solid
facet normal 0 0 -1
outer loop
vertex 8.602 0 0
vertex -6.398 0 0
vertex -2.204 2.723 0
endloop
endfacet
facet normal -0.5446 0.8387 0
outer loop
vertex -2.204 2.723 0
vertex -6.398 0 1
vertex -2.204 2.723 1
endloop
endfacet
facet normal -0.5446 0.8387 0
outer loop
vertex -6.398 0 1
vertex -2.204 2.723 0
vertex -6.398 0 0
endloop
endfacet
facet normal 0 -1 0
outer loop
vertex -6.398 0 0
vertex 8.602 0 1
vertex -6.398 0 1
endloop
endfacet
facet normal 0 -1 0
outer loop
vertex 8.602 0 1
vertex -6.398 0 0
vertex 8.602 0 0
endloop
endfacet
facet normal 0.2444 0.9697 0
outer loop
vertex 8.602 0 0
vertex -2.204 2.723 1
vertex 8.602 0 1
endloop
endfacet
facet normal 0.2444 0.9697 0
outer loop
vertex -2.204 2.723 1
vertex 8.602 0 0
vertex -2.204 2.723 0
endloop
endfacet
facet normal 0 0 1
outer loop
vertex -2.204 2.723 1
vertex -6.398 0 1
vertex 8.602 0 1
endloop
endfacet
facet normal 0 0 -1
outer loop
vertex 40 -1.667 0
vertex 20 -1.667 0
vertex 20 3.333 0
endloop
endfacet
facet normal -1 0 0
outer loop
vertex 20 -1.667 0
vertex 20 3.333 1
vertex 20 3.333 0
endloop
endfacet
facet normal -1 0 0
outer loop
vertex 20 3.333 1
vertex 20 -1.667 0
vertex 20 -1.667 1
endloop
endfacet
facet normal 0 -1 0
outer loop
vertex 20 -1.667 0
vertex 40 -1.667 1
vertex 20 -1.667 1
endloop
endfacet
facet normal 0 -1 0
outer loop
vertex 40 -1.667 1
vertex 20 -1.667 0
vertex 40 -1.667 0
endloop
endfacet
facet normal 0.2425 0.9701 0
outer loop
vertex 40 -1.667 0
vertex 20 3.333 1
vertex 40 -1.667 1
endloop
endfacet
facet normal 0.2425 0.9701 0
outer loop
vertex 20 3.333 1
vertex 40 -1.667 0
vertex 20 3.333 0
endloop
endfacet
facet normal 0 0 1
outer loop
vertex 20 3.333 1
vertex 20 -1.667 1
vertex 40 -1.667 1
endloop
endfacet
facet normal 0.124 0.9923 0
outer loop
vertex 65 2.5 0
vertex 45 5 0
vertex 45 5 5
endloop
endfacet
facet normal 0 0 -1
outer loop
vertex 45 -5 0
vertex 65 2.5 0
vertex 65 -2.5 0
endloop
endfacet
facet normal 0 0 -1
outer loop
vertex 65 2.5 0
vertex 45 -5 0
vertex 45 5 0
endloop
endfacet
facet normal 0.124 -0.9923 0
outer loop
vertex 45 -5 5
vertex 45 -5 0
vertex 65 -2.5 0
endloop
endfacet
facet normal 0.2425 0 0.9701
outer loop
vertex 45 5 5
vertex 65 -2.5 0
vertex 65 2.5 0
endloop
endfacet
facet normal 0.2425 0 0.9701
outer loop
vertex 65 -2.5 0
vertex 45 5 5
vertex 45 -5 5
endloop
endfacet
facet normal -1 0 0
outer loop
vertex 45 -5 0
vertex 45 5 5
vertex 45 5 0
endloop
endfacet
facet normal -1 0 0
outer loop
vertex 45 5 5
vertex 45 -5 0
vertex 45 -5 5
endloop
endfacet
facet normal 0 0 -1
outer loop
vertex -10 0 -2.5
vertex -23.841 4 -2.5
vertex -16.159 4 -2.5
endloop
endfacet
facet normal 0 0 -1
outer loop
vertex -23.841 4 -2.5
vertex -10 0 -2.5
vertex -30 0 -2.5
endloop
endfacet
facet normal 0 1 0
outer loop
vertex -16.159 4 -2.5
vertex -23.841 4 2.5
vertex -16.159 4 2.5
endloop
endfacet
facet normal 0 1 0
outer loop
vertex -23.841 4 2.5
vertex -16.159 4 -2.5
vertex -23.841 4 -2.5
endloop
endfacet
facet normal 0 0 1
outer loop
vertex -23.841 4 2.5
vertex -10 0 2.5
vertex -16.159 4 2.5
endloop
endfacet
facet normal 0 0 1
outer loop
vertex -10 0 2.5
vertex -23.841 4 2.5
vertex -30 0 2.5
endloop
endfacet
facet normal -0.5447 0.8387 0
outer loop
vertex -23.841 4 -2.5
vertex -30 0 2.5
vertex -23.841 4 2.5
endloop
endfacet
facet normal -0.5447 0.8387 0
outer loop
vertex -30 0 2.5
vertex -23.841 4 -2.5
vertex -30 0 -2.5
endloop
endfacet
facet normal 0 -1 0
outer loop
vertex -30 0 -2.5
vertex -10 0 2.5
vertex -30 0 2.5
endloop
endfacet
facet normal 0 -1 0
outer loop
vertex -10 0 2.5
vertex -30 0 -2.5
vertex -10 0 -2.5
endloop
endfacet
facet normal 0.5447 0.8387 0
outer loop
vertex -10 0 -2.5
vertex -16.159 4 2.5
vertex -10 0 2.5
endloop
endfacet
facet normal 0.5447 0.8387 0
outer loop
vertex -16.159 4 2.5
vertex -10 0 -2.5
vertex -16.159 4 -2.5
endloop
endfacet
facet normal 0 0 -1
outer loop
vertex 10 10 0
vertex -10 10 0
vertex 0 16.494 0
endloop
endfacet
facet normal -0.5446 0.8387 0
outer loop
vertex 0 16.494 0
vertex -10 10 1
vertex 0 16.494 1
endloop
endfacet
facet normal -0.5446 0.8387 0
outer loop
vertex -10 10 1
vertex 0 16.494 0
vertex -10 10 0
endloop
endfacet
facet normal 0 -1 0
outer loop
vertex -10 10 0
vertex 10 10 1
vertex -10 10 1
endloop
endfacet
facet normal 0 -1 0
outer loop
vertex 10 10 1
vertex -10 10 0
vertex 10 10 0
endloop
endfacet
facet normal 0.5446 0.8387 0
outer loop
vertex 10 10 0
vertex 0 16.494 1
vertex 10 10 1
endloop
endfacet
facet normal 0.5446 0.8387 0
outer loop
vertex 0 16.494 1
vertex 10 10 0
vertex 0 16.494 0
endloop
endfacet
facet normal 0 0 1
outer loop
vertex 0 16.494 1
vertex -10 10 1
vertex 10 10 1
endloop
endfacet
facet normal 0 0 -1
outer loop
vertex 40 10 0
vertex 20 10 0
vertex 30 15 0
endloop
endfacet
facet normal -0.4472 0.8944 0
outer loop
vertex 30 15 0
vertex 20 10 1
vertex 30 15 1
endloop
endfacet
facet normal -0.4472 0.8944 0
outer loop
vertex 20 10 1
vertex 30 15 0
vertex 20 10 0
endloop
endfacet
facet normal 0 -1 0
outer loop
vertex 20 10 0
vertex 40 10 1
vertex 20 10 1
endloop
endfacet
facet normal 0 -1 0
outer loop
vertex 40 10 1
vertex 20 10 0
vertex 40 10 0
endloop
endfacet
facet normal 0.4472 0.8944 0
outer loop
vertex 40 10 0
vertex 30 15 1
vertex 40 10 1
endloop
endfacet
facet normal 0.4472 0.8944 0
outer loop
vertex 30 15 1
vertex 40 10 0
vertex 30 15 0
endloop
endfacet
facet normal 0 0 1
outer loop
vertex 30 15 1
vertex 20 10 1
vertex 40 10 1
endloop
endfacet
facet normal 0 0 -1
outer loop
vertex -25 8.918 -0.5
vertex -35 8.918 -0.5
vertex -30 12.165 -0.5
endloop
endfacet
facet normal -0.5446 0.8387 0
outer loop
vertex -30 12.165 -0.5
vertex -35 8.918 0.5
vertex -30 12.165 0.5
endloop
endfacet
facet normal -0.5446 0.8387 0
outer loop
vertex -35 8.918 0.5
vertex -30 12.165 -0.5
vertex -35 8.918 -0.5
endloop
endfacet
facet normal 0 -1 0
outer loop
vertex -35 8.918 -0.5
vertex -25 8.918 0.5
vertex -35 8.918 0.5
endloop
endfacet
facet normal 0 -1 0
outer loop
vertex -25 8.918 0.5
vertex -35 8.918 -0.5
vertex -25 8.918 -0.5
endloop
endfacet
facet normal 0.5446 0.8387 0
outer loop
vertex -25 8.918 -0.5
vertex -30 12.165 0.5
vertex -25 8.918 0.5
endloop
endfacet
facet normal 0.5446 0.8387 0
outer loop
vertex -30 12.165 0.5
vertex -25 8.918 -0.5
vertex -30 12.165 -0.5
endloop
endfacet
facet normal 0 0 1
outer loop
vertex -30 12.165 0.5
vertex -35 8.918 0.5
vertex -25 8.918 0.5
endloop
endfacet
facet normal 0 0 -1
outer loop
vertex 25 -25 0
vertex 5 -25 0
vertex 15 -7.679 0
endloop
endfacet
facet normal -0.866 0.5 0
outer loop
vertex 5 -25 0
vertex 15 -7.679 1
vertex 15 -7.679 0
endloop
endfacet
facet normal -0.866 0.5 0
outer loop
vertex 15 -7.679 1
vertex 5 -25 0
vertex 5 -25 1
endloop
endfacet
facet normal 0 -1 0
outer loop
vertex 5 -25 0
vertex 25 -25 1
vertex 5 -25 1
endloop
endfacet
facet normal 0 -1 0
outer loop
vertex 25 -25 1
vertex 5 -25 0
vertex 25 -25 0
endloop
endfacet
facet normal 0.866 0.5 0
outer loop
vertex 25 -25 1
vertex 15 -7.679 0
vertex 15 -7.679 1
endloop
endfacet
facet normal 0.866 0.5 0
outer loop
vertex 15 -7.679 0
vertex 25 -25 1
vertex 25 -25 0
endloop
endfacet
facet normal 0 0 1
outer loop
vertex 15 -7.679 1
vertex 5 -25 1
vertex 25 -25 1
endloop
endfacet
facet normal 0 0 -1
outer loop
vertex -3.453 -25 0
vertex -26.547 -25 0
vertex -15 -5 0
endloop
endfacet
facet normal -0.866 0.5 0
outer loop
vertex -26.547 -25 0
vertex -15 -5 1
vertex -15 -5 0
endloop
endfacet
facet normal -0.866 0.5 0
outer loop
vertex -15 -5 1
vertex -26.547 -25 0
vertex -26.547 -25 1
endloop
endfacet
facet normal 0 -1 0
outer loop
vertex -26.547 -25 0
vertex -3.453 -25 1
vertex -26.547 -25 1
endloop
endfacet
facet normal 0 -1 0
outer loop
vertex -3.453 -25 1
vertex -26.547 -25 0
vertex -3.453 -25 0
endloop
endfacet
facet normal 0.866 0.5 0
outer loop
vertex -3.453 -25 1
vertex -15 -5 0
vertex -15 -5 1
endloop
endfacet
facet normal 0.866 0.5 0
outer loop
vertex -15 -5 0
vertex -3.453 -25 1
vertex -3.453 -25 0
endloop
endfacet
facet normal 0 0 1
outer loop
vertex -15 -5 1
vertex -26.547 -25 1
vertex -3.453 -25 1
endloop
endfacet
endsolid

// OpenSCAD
/*
   Triangles.scad
Author: Tim Koopman
https://github.com/tkoopman/Delta-Diamond/blob/master/OpenSCAD/Triangles.scad

angleCA
/|\
a / H \ c
/  |  \
angleAB ------- angleBC
b

Standard Parameters
center: true/false
If true same as centerXYZ = [true, true, true]

centerXYZ: Vector of 3 true/false values [CenterX, CenterY, CenterZ]
center must be left undef

height: The 3D height of the Triangle. Ignored if heights defined

heights: Vector of 3 height values heights @ [angleAB, angleBC, angleCA]
If CenterZ is true each height will be centered individually, this means
the shape will be different depending on CenterZ. Most times you will want
CenterZ to be true to get the shape most people want.
 */

/* 
   Triangle
a: Length of side a
b: Length of side b
angle: angle at point angleAB
 */
module Triangle(
        a, b, angle, height=1, heights=undef,
        center=undef, centerXYZ=[false,false,false])
{
    // Calculate Heights at each point
    heightAB = ((heights==undef) ? height : heights[0])/2;
    heightBC = ((heights==undef) ? height : heights[1])/2;
    heightCA = ((heights==undef) ? height : heights[2])/2;
    centerZ = (center || (center==undef && centerXYZ[2]))?0:max(heightAB,heightBC,heightCA);

    // Calculate Offsets for centering
    offsetX = (center || (center==undef && centerXYZ[0]))?((cos(angle)*a)+b)/3:0;
    offsetY = (center || (center==undef && centerXYZ[1]))?(sin(angle)*a)/3:0;

    pointAB1 = [-offsetX,-offsetY, centerZ-heightAB];
    pointAB2 = [-offsetX,-offsetY, centerZ+heightAB];
    pointBC1 = [b-offsetX,-offsetY, centerZ-heightBC];
    pointBC2 = [b-offsetX,-offsetY, centerZ+heightBC];
    pointCA1 = [(cos(angle)*a)-offsetX,(sin(angle)*a)-offsetY, centerZ-heightCA];
    pointCA2 = [(cos(angle)*a)-offsetX,(sin(angle)*a)-offsetY, centerZ+heightCA];

    polyhedron(
            points=[	pointAB1, pointBC1, pointCA1,
            pointAB2, pointBC2, pointCA2 ],
            triangles=[	
            [0, 1, 2],
            [3, 5, 4],
            [0, 3, 1],
            [1, 3, 4],
            [1, 4, 2],
            [2, 4, 5],
            [2, 5, 0],
            [0, 5, 3] ] );
}

/*
   Isosceles Triangle
   Exactly 2 of the following paramaters must be defined.
   If all 3 defined H will be ignored.
b: length of side b
angle: angle at points angleAB & angleBC.
 */
module Isosceles_Triangle(
        b, angle, H=undef, height=1, heights=undef,
        center=undef, centerXYZ=[true, false, false])
{
    valid = 	(angle!=undef)?((angle < 90) && (b!=undef||H!=undef)) : (b!=undef&&H!=undef);
    ANGLE = (angle!=undef) ? angle : atan(H / (b/2));
    a = (b==undef)?(H/sin((180-(angle*2))/2)) : 
        (b / cos(ANGLE))/2;
    B = (b==undef)? (cos(angle)*a)*2:b;
    if (valid)
    {
        Triangle(a=a, b=B, angle=ANGLE, height=height, heights=heights,
                center=center, centerXYZ=centerXYZ);
    } else {
        echo("Invalid Isosceles_Triangle. Must specify any 2 of b, angle and H, and if angle used angle must be less than 90");
    }
}

/*
   Right Angled Triangle
   Create a Right Angled Triangle where the hypotenuse will be calculated.

   |\
   a| \
   |  \
   ----
   b
a: length of side a
b: length of side b
 */
module Right_Angled_Triangle(
        a, b, height=1, heights=undef,
        center=undef, centerXYZ=[false, false, false])
{
    Triangle(a=a, b=b, angle=90, height=height, heights=heights,
            center=center, centerXYZ=centerXYZ);
}

/*
   Wedge
   Is same as Right Angled Triangle with 2 different heights, and rotated.
   Good for creating support structures.
 */
module Wedge(a, b, w1, w2)
{
    rotate([90,0,0])
        Right_Angled_Triangle(a, b, heights=[w1, w2, w1], centerXYZ=[false, false, true]);
}

/*
   Equilateral Triangle
   Create a Equilateral Triangle.

l: Length of all sides (a, b & c)
H: Triangle size will be based on the this 2D height
When using H, l is ignored.
 */
module Equilateral_Triangle(
        l=10, H=undef, height=1, heights=undef,
        center=undef, centerXYZ=[true,false,false])
{
    L = (H==undef)?l:H/sin(60);
    Triangle(a=L,b=L,angle=60,height=height, heights=heights,
            center=center, centerXYZ=centerXYZ);
}

/*
   Trapezoid
   Create a Basic Trapezoid (Based on Isosceles_Triangle)

   d
   /----\
   /  |   \
   a  /   H    \ c
   /    |     \
   angle ------------ angle
   b

b: Length of side b
angle: Angle at points angleAB & angleBC
H: The 2D height at which the triangle should be cut to create the trapezoid
heights: If vector of size 3 (Standard for triangles) both cd & da will be the same height, if vector have 4 values [ab,bc,cd,da] than each point can have different heights.
 */
module Trapezoid(
        b, angle=60, H, height=1, heights=undef,
        center=undef, centerXYZ=[true,false,false])
{
    validAngle = (angle < 90);
    adX = H / tan(angle);

    // Calculate Heights at each point
    heightAB = ((heights==undef) ? height : heights[0])/2;
    heightBC = ((heights==undef) ? height : heights[1])/2;
    heightCD = ((heights==undef) ? height : heights[2])/2;
    heightDA = ((heights==undef) ? height : ((len(heights) > 3)?heights[3]:heights[2]))/2;

    // Centers
    centerX = (center || (center==undef && centerXYZ[0]))?0:b/2;
    centerY = (center || (center==undef && centerXYZ[1]))?0:H/2;
    centerZ = (center || (center==undef && centerXYZ[2]))?0:max(heightAB,heightBC,heightCD,heightDA);

    // Points
    y = H/2;
    bx = b/2;
    dx = (b-(adX*2))/2;

    pointAB1 = [centerX-bx, centerY-y, centerZ-heightAB];
    pointAB2 = [centerX-bx, centerY-y, centerZ+heightAB];
    pointBC1 = [centerX+bx, centerY-y, centerZ-heightBC];
    pointBC2 = [centerX+bx, centerY-y, centerZ+heightBC];
    pointCD1 = [centerX+dx, centerY+y, centerZ-heightCD];
    pointCD2 = [centerX+dx, centerY+y, centerZ+heightCD];
    pointDA1 = [centerX-dx, centerY+y, centerZ-heightDA];
    pointDA2 = [centerX-dx, centerY+y, centerZ+heightDA];

    validH = (adX < b/2);

    if (validAngle && validH)
    {
        polyhedron(
                points=[	pointAB1, pointBC1, pointCD1, pointDA1,
                pointAB2, pointBC2, pointCD2, pointDA2 ],
                triangles=[	
                [0, 1, 2],
                [0, 2, 3],
                [4, 6, 5],
                [4, 7, 6],
                [0, 4, 1],
                [1, 4, 5],
                [1, 5, 2],
                [2, 5, 6],
                [2, 6, 3],
                [3, 6, 7],
                [3, 7, 0],
                [0, 7, 4]	] );
    } else {
        if (!validAngle) echo("Trapezoid invalid, angle must be less than 90");
        else echo("Trapezoid invalid, H is larger than triangle");
    }
}


// Examples
Triangle(a=5, b=15, angle=33, centerXYZ=[true,false,false]);
translate([20,0,0]) Right_Angled_Triangle(a=5, b=20, centerXYZ=[false,true,false]);
translate([45,0,0]) Wedge(a=5, b=20, w1=10, w2=5);
translate([-20,0,0]) Trapezoid(b=20, angle=33, H=4, height=5, centerXYZ=[true,false,true]);

translate([0,10,0]) Isosceles_Triangle(b=20, angle=33);
translate([30,10,0]) Isosceles_Triangle(b=20, H=5);
translate([-30,10,0]) Isosceles_Triangle(angle=33, H=5, center=true);

translate([15,-25,0]) Equilateral_Triangle(l=20);
translate([-15,-25,0]) Equilateral_Triangle(H=20);
